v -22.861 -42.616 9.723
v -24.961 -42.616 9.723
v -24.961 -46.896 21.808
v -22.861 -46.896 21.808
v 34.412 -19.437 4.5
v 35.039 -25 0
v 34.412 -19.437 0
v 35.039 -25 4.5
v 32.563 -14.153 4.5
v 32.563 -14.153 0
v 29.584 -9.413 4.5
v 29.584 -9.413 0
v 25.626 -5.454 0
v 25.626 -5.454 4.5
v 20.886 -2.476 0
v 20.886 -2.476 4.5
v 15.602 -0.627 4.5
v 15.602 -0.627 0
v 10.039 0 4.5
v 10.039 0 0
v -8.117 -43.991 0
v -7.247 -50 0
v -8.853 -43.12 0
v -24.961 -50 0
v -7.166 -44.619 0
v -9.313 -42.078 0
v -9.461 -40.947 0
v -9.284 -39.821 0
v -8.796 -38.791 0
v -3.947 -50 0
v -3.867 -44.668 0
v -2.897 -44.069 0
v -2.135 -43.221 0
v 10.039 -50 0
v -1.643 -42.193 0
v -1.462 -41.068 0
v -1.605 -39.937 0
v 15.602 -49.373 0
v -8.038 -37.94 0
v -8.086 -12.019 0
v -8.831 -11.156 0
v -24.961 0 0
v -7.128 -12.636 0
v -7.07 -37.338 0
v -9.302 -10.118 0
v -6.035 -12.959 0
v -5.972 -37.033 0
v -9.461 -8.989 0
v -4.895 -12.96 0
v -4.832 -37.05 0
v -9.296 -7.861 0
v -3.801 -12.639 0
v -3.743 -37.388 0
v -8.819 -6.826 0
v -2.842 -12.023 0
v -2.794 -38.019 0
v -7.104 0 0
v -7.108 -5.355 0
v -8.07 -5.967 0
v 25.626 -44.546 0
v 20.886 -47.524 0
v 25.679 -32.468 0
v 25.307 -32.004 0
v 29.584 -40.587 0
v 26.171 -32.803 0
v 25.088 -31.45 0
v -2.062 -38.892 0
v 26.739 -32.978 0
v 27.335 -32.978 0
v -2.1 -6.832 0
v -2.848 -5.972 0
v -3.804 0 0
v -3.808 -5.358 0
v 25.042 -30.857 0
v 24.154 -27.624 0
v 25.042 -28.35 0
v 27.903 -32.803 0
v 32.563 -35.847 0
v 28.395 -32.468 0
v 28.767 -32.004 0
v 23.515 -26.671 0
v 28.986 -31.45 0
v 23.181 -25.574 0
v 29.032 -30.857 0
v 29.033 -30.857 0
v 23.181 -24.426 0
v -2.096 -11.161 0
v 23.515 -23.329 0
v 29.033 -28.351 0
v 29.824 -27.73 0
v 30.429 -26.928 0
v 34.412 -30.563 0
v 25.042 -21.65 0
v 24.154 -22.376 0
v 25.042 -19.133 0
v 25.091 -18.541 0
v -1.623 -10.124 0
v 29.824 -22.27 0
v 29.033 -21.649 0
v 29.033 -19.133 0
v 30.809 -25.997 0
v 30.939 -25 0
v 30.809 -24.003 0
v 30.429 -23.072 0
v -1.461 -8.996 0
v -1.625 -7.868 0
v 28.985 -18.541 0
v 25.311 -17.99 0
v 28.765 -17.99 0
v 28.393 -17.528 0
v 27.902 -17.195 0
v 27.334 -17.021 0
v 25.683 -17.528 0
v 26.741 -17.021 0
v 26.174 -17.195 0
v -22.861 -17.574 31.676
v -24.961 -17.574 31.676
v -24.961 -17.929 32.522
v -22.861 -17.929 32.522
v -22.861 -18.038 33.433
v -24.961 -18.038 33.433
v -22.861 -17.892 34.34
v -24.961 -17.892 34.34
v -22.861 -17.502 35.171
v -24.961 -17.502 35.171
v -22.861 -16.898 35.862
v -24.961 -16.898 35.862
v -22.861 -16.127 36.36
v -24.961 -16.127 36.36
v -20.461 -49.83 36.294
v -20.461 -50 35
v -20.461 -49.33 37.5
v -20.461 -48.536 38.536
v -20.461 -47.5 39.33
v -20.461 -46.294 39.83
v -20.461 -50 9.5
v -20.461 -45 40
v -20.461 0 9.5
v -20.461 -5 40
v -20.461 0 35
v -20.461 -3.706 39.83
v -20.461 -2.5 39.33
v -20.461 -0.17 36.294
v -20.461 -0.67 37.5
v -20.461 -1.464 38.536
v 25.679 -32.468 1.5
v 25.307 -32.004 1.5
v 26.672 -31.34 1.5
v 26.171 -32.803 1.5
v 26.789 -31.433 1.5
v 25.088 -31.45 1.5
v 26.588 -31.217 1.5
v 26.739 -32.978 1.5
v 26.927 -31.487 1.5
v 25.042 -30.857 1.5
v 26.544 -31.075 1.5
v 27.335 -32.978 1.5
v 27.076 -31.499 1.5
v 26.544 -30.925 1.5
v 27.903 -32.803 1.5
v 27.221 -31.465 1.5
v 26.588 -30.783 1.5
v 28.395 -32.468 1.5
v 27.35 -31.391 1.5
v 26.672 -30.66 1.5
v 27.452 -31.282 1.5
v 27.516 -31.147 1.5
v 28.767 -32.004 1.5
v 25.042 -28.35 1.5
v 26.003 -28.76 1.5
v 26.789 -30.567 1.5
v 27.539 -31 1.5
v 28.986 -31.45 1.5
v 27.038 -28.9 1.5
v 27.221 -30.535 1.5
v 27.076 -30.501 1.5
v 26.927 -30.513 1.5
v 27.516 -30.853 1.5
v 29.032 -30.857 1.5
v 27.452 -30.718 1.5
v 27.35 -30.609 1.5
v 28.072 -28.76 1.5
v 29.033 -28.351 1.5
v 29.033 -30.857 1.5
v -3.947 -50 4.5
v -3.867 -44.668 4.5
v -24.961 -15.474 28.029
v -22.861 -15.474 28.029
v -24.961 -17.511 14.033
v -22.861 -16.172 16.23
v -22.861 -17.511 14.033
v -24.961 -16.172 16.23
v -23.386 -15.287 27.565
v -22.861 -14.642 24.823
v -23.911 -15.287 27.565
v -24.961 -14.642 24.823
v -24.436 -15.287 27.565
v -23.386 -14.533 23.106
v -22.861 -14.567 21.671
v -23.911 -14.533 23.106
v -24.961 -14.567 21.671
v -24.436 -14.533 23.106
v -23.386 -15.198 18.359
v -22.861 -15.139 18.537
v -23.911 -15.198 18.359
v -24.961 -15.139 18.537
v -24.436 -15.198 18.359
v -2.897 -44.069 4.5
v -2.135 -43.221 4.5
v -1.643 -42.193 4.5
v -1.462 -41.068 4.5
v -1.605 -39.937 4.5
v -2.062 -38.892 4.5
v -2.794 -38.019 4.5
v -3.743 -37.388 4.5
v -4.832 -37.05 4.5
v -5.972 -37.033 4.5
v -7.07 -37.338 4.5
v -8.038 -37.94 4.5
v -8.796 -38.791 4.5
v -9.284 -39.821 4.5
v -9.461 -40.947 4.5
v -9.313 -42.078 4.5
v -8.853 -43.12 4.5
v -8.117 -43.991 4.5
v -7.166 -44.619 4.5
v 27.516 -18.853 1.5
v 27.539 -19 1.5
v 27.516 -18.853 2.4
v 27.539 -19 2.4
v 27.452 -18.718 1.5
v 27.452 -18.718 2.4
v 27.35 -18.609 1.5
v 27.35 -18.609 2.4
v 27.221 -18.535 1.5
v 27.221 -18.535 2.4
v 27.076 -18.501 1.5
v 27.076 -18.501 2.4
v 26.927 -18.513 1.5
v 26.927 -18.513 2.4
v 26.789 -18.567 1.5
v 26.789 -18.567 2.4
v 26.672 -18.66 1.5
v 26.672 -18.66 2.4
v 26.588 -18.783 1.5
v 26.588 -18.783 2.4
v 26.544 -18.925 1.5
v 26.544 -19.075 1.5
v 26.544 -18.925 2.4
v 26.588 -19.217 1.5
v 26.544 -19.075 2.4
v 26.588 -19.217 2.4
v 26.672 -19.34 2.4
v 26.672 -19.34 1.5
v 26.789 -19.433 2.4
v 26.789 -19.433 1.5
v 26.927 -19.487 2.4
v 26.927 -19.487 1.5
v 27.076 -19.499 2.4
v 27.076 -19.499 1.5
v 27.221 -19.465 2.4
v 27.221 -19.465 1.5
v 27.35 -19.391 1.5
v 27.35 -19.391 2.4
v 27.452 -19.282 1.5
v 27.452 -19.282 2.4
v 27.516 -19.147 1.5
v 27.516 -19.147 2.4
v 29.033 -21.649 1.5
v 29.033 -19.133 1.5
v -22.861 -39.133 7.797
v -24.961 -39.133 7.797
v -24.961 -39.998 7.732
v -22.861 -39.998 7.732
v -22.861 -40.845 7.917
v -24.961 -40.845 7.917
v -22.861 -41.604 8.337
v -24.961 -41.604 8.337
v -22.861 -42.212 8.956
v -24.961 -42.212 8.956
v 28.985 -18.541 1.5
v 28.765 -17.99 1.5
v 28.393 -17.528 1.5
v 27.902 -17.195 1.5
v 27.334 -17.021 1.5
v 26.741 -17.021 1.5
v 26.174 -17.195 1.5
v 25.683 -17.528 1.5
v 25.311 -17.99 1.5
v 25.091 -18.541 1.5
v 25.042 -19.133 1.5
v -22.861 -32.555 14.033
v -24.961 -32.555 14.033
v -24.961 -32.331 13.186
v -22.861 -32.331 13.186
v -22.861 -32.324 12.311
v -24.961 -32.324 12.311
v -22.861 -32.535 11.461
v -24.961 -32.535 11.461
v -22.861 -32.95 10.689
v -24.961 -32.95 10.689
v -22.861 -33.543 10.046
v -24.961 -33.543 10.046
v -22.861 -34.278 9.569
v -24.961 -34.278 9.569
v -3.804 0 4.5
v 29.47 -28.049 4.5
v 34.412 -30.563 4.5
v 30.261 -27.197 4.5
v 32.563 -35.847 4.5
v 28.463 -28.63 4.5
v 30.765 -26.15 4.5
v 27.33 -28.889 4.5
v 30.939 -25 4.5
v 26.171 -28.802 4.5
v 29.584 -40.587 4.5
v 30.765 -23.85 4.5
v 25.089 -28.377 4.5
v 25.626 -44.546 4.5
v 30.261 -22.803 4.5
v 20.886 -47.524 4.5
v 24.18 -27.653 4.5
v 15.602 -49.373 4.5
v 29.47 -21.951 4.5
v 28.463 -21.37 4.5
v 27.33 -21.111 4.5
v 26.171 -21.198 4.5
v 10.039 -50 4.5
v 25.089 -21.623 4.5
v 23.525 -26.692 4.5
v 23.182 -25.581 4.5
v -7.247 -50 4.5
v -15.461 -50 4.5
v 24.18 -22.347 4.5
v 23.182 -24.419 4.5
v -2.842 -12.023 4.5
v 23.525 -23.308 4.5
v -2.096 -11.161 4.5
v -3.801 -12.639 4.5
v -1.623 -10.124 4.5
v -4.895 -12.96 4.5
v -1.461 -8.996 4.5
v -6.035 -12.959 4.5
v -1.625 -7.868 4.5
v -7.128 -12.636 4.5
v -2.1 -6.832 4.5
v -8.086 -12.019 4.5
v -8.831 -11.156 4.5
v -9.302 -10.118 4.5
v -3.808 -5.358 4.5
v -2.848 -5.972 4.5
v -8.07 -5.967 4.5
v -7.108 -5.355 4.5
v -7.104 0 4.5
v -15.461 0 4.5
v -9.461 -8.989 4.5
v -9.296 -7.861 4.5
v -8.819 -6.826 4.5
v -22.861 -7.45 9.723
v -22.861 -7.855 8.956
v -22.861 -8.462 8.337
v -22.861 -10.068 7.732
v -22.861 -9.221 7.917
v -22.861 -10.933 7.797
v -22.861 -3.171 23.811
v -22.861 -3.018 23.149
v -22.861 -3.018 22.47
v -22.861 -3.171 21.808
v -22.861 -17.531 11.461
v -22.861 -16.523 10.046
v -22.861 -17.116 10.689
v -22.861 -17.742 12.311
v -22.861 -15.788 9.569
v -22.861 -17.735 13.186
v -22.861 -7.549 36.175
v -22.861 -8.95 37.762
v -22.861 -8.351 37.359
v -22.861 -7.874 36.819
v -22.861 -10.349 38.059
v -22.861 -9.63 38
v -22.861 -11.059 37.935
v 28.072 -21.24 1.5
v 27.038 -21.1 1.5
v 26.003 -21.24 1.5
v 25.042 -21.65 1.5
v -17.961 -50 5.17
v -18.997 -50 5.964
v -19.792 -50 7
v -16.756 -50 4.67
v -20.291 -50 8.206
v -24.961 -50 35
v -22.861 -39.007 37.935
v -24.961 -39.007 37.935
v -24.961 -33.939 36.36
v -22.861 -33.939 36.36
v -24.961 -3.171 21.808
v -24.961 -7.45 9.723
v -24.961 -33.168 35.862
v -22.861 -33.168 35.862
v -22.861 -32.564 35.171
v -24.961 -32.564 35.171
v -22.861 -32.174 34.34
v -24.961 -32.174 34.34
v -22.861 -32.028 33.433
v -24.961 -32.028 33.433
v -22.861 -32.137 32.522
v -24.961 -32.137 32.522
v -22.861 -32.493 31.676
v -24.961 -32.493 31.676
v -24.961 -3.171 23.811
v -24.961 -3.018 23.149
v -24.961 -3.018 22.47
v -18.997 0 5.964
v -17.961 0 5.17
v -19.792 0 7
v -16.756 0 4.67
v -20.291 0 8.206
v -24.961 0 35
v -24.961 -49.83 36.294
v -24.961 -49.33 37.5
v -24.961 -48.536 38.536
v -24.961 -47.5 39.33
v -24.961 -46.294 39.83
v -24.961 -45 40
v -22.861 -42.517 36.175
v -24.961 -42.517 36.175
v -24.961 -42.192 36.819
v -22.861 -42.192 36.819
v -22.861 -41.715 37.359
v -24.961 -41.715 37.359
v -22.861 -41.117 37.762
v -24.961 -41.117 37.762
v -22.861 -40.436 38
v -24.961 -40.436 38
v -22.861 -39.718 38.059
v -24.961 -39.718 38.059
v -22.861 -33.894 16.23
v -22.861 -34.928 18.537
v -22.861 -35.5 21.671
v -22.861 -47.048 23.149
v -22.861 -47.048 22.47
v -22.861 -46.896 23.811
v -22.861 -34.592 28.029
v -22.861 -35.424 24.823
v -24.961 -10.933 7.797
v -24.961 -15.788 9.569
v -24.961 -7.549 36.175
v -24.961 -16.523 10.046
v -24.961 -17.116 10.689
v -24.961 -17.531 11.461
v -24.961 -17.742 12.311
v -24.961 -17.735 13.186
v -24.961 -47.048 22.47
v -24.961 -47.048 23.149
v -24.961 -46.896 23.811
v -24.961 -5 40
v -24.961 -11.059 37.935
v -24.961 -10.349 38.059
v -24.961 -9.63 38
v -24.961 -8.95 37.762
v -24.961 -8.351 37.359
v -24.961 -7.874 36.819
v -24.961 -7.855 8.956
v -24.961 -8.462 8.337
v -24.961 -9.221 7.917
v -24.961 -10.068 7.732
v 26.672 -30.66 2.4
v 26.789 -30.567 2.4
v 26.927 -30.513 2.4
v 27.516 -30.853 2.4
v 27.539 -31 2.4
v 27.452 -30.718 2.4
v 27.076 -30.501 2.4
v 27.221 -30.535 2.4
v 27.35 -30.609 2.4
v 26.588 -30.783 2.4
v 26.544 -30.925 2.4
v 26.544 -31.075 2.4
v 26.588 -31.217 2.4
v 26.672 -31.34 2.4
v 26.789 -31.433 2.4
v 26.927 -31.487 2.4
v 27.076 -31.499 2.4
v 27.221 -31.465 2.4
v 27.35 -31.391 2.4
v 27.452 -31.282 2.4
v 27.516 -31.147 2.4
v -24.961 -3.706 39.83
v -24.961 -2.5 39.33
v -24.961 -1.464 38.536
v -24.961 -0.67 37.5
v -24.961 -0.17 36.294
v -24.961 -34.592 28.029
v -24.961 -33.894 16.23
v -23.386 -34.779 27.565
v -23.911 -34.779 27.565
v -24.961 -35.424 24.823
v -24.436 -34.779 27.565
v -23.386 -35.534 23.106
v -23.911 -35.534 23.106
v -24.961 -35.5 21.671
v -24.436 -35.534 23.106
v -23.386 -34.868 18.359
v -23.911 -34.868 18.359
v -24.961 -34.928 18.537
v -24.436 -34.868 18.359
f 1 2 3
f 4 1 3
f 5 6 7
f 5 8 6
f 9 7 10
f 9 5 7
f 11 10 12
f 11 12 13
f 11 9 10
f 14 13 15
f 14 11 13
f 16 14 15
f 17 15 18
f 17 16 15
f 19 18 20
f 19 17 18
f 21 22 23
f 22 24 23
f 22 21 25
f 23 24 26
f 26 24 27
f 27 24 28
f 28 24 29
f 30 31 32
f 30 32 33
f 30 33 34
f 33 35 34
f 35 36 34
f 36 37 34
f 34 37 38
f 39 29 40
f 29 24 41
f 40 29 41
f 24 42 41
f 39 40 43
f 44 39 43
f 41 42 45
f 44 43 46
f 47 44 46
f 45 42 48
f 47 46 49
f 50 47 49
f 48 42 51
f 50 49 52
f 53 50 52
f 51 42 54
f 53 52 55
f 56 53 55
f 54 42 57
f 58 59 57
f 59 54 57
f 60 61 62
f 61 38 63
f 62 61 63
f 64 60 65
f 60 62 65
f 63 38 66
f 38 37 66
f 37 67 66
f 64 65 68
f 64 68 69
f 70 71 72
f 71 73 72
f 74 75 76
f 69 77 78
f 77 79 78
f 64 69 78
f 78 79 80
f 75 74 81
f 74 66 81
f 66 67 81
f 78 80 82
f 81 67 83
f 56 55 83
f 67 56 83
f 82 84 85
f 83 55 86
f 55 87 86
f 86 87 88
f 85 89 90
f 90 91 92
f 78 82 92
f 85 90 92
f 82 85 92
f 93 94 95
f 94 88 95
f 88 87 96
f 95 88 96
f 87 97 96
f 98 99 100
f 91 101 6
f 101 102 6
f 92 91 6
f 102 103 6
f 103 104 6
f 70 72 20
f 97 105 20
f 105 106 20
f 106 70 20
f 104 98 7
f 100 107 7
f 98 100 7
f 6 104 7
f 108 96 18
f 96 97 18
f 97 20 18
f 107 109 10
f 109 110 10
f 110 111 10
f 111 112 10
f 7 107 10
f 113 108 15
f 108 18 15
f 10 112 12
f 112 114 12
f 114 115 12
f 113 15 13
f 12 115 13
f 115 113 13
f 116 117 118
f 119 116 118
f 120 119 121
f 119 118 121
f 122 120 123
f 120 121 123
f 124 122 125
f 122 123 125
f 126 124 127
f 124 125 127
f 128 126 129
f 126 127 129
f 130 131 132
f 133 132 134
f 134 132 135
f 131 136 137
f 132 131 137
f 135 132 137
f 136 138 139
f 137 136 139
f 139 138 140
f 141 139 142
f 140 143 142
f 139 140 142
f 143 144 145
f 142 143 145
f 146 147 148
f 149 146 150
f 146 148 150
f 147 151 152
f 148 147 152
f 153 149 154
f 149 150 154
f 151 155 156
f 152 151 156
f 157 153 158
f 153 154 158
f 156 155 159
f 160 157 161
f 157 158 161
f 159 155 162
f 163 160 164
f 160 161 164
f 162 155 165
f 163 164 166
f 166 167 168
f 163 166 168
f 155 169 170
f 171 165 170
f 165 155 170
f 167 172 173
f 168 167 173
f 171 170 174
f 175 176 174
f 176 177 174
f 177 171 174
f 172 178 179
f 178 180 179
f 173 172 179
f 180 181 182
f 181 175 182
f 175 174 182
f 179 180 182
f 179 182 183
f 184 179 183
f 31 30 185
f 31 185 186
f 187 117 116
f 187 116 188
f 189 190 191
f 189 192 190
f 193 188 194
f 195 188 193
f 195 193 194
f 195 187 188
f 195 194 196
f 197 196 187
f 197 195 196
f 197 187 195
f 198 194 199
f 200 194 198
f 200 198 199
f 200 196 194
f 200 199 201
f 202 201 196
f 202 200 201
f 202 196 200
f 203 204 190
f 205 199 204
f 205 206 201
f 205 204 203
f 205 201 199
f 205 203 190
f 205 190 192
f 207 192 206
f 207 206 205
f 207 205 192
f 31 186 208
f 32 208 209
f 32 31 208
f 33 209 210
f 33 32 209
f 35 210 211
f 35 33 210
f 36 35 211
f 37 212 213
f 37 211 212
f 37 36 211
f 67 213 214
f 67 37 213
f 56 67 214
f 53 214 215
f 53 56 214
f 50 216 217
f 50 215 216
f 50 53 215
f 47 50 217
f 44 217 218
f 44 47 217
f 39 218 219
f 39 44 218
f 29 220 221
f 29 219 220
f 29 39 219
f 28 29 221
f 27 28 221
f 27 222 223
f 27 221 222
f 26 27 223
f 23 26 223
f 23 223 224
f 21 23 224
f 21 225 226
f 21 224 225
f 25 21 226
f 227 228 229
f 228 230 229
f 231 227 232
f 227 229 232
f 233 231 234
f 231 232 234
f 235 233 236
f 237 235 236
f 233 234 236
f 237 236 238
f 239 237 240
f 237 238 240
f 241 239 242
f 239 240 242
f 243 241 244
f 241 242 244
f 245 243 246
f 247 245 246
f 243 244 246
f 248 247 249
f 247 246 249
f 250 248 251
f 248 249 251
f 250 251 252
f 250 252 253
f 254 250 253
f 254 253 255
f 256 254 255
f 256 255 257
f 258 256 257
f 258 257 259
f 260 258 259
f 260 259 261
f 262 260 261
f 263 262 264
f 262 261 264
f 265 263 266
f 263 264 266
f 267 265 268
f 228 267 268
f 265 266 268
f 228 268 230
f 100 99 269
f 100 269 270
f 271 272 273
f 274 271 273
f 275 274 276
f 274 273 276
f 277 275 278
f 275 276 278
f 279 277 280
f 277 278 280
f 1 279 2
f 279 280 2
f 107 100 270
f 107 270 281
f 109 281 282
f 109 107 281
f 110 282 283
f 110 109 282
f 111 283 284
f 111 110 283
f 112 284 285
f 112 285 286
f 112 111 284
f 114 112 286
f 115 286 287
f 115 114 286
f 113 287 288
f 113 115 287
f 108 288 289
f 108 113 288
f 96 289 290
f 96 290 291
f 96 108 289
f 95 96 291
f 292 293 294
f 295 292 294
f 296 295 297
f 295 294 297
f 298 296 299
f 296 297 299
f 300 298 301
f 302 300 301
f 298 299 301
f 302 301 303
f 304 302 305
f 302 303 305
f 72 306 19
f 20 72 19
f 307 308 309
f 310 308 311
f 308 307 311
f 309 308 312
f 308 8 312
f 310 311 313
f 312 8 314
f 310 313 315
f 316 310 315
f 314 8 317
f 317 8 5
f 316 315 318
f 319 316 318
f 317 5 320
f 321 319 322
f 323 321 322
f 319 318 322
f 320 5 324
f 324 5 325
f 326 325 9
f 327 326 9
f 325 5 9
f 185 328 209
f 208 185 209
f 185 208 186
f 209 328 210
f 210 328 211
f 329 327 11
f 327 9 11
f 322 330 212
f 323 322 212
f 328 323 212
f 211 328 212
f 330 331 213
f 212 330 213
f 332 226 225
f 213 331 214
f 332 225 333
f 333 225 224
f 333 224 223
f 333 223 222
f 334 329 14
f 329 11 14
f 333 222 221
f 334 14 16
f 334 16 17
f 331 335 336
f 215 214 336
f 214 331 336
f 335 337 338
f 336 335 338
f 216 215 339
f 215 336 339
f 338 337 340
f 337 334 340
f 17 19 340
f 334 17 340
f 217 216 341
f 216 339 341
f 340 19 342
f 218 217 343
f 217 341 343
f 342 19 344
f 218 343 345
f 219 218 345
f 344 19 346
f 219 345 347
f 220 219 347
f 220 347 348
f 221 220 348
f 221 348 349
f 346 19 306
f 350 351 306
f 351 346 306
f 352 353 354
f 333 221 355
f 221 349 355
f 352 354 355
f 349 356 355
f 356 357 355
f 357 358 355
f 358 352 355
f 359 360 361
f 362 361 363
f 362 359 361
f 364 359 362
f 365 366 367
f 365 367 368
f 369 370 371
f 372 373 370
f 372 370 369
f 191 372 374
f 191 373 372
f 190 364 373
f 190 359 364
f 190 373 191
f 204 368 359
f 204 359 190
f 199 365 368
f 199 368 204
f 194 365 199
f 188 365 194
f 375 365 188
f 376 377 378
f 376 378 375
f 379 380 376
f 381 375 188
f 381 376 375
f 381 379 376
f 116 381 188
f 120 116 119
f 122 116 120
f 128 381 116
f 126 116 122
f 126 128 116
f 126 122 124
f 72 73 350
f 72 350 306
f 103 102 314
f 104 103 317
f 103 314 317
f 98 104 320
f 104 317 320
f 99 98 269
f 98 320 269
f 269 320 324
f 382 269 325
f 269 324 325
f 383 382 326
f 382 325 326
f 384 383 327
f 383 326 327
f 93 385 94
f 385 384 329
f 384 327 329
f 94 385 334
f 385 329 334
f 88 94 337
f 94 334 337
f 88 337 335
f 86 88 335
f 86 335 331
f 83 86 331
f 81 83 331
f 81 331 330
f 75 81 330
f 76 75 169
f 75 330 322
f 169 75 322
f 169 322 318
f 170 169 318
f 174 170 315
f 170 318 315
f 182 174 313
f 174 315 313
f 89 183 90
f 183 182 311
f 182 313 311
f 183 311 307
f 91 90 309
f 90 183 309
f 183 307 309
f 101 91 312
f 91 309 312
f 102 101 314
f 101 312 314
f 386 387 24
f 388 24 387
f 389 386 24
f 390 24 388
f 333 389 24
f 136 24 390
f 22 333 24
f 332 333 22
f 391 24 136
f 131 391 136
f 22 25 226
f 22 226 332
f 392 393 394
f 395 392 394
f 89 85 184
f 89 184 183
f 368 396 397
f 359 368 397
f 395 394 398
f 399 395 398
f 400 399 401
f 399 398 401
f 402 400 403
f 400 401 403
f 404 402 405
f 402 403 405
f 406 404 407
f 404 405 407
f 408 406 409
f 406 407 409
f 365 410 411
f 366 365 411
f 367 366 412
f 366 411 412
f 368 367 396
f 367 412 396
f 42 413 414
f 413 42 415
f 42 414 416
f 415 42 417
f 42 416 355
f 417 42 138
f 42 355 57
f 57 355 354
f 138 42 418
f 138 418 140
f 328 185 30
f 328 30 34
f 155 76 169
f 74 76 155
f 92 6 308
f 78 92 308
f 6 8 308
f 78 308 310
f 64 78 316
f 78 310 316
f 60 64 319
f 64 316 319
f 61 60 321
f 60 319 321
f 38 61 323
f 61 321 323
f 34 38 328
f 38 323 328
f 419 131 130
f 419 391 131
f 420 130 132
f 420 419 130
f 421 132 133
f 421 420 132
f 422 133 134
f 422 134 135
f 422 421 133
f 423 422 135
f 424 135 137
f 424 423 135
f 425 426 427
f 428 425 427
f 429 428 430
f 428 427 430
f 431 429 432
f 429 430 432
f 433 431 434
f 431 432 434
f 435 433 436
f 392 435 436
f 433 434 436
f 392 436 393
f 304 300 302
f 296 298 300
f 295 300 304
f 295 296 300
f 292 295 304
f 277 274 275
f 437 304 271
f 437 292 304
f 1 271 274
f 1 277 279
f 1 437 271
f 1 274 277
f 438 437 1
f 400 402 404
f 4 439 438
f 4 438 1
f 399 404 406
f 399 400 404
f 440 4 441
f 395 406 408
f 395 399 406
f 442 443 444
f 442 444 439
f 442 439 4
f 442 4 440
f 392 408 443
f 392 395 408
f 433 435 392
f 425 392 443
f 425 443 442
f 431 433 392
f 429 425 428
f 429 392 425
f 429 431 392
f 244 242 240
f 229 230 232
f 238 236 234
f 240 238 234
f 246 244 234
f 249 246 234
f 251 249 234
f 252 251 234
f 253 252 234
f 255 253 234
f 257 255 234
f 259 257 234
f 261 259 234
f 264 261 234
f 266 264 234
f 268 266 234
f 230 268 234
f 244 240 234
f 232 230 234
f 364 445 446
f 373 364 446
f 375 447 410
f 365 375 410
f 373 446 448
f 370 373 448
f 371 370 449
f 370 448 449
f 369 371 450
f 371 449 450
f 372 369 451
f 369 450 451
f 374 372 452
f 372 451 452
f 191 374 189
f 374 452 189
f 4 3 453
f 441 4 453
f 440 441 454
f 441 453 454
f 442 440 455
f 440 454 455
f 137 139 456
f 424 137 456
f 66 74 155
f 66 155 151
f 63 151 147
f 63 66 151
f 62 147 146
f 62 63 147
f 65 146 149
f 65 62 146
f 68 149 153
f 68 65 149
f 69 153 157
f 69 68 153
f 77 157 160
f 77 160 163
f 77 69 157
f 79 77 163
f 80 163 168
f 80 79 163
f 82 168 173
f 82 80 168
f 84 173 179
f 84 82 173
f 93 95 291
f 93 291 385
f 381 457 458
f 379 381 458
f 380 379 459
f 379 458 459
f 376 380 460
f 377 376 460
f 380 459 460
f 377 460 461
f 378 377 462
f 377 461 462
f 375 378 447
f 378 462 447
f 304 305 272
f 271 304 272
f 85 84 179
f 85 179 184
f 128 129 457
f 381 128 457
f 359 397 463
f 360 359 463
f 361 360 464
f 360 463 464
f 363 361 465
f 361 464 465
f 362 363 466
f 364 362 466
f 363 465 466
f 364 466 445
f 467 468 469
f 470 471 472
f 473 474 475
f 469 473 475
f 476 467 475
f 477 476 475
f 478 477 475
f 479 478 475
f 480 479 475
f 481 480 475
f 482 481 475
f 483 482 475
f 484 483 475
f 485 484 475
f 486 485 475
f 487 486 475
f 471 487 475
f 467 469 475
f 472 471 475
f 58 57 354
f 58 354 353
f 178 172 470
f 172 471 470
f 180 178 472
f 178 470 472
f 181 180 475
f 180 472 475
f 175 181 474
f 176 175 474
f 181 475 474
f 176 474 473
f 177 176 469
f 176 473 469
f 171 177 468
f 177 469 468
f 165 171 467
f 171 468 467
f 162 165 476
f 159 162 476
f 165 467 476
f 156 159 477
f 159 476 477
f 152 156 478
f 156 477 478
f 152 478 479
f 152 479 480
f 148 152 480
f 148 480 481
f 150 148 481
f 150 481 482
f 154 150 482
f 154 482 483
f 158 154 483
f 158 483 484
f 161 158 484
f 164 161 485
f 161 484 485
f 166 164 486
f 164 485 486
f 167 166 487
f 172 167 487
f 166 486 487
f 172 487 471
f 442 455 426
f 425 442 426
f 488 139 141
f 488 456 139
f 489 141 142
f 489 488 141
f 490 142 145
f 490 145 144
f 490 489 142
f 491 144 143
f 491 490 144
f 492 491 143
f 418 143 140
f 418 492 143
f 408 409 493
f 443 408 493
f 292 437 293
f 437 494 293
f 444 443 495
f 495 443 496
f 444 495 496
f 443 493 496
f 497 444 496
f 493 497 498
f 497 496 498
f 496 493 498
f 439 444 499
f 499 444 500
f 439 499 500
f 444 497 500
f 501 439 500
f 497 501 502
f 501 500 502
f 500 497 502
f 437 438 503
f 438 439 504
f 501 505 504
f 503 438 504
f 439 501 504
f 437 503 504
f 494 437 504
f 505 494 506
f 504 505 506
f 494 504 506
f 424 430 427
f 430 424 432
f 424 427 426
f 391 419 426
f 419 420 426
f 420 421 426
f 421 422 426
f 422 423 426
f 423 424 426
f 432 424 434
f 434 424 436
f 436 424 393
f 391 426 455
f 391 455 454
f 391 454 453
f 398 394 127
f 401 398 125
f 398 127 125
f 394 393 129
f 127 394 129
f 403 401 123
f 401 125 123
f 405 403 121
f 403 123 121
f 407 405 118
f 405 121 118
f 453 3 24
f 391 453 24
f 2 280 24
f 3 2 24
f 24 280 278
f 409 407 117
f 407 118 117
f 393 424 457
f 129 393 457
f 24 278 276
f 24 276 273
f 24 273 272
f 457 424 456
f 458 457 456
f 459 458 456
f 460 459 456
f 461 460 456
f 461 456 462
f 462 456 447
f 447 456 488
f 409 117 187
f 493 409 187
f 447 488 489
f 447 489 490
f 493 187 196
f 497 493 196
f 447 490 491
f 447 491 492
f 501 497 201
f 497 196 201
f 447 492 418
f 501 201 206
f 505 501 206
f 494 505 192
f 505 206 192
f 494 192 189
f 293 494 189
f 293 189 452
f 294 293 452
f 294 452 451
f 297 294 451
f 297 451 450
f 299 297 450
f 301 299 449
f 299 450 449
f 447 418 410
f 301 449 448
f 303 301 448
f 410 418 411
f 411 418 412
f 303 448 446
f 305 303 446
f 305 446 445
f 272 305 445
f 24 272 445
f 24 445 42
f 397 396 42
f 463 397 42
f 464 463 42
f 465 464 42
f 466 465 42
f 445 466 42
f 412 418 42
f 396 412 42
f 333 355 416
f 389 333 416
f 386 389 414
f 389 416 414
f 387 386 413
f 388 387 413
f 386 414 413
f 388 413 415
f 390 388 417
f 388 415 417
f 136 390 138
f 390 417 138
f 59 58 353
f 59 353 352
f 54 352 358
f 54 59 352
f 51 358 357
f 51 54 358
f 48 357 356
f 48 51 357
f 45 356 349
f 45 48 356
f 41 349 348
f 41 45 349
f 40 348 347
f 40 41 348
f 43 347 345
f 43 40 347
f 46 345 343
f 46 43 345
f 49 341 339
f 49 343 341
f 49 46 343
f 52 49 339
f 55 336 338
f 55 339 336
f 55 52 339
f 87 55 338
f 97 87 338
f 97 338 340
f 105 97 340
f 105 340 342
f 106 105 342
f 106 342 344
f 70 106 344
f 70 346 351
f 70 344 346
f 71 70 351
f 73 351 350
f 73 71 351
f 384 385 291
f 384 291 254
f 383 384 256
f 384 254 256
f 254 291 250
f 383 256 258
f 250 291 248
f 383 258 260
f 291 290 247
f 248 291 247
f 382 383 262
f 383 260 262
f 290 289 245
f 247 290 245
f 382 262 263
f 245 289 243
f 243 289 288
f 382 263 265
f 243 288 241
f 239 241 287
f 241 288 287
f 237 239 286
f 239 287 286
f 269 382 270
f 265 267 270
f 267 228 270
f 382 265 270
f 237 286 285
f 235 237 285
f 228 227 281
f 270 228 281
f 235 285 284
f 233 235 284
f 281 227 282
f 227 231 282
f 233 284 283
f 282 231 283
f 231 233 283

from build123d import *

# Parameters (mm, degrees)
F1_DEPTH  = 50
F2_R      = 25
F3_R      = 24.99999
F4_R      = 3.9
F5_DEPTH  = 12.5
F7_R      = 0.5
F8_DEPTH  = 2.4
F6_R      = 0.5
F9_DEPTH  = 2.4
F11_DEPTH = 1.5
F12_R     = 5
F13_R     = 5
F15_DEPTH = 2.1
F17_DEPTH = 25
F18_DEPTH = 25


# Not quite as in the source:
# - a fillet or chamfer is up to 0.001 mm smaller than in the source, because OpenCascade refuses the exact size
# - ends of sketch curves that miss each other by under 0.0002 mm in the source are joined


with BuildPart() as f1:
    # F0 (on Front) → F1 (new body)
    with BuildSketch(Plane.XZ):
        with BuildLine():
            Line((-24.9614193552, 0), (35.0385806448, 0))
            Line((35.0385806448, 0), (35.0385806448, 4.5))
            Line((35.0385806448, 4.5), (-15.4614193552, 4.5))
            ThreePointArc((-15.4614193552, 4.5), (-18.9969532612, 5.9644660941), (-20.4614193552, 9.5))
            Line((-20.4614193552, 9.5), (-20.4614193552, 40))
            Line((-20.4614193552, 40), (-24.9614193552, 40))
            Line((-24.9614193552, 40), (-24.9614193552, 0))
        make_face()
    extrude(amount=F1_DEPTH)

    # F2
    f2_edges = [f1.edges().sort_by_distance(p)[0] for p in [
        (35.038581, 0, 2.25),
    ]]
    fillet(f2_edges, radius=F2_R)

    # F3 (radius 25 in the source; OpenCascade refuses exactly that, so slightly less here)
    f3_edges = [f1.edges().sort_by_distance(p)[0] for p in [
        (35.038581, -50, 2.25),
    ]]
    fillet(f3_edges, radius=F3_R)

    # F4 (on face) → F5 (cut, symmetric)
    with BuildSketch(Plane.XY.offset(4.5)):
        with Locations((27.0385806448, -25)):
            Circle(F4_R)
    extrude(amount=F5_DEPTH, both=True, mode=Mode.SUBTRACT)

    # F7 (on Top) → F8 (cut, symmetric)
    with BuildSketch(Plane.XY):
        with Locations((27.0385806448, -19)):
            Circle(F7_R)
    extrude(amount=F8_DEPTH, both=True, mode=Mode.SUBTRACT)

    # F6 (on Top) → F9 (cut, symmetric)
    with BuildSketch(Plane.XY):
        with Locations((27.0385806448, -31)):
            Circle(F6_R)
    extrude(amount=F9_DEPTH, both=True, mode=Mode.SUBTRACT)

    # F10 (on Top) → F11 (cut)
    with BuildSketch(Plane.XY):
        with BuildLine():
            Line((25.0421970529, -19.1326886576), (25.0421970529, -30.8567436225))
            ThreePointArc((25.0421970529, -30.8567436225), (27.0370224854, -33.0005194676), (29.031847918, -30.8567436225))
            Line((29.031847918, -30.8567436225), (29.0331744321, -30.8567436225))
            Line((29.0331744321, -30.8567436225), (29.0331744321, -19.1326886576))
            ThreePointArc((29.0331744321, -19.1326886576), (27.0376323306, -16.9991781279), (25.0421970529, -19.1326886576))
        make_face()
    extrude(amount=F11_DEPTH, mode=Mode.SUBTRACT)

    # F12
    f12_edges = [f1.edges().sort_by_distance(p)[0] for p in [
        (-22.711419, -50, 40),
    ]]
    fillet(f12_edges, radius=F12_R)

    # F13
    f13_edges = [f1.edges().sort_by_distance(p)[0] for p in [
        (-22.711419, 0, 40),
    ]]
    fillet(f13_edges, radius=F13_R)

    # F14 (on face) → F15 (cut)
    with BuildSketch(Plane(origin=(-24.9614193552, 0, 0), x_dir=(0, -1, 0), z_dir=(-1, 0, 0))):
        with BuildLine():
            Line((46.8955885446, 23.8107649305), (42.5171071131, 36.1752150642))
            ThreePointArc((42.5171071131, 36.1752150642), (41.1165449237, 37.7616933331), (39.0073708388, 37.93452974))
            Line((39.0073708388, 37.93452974), (33.9392572641, 36.3604687154))
            ThreePointArc((33.9392572641, 36.3604687154), (32.1739564338, 34.3397574907), (32.4926399743, 31.675549977))
            add(Edge.make_bspline(
                [(32.4926399743, 31.675549977), (33.3670492771, 30.3381403961), (35.0987739091, 27.6894664778), (35.7199990478, 23.1066149427), (35.2211127015, 18.2107984297), (33.4472667585, 15.4309330693), (32.5552672148, 14.0330446884)],
                knots=[0, 0, 0, 0, 0.2493081883, 0.4937426091, 0.7454224458, 1, 1, 1, 1], degree=3))
            ThreePointArc((32.5552672148, 14.0330446884), (32.5347631708, 11.4606329376), (34.2782102525, 9.5690423623))
            Line((34.2782102525, 9.5690423623), (39.1331128776, 7.7970703132))
            ThreePointArc((39.1331128776, 7.7970703132), (41.2400733133, 8.0993579825), (42.6161779425, 9.723241033))
            Line((42.6161779425, 9.723241033), (46.8955885446, 21.8079237751))
            ThreePointArc((46.8955885446, 21.8079237751), (47.0676640713, 22.8093443528), (46.8955885446, 23.8107649305))
        make_face()
        with BuildLine():
            ThreePointArc((3.1705893979, 23.8107653384), (2.9985138712, 22.8093447607), (3.1705893979, 21.807924183))
            Line((3.1705893979, 21.807924183), (7.45, 9.723241441))
            ThreePointArc((7.45, 9.723241441), (8.8261046292, 8.0993583904), (10.9330650649, 7.7970707212))
            Line((10.9330650649, 7.7970707212), (15.78796769, 9.5690427702))
            ThreePointArc((15.78796769, 9.5690427702), (17.5314147718, 11.4606333455), (17.5109107277, 14.0330450963))
            add(Edge.make_bspline(
                [(17.5735379682, 31.6755503849), (16.6991286655, 30.3381408041), (14.9674040335, 27.6894668857), (14.3461788947, 23.1066153507), (14.8450652411, 18.2107988376), (16.618911184, 15.4309334772), (17.5109107277, 14.0330450963)],
                knots=[0, 0, 0, 0, 0.2493081883, 0.4937426091, 0.7454224458, 1, 1, 1, 1], degree=3))
            ThreePointArc((17.5735379682, 31.6755503849), (17.8922215087, 34.3397578986), (16.1269206784, 36.3604691233))
            Line((16.1269206784, 36.3604691233), (11.0588071037, 37.9345301479))
            ThreePointArc((11.0588071037, 37.9345301479), (8.9496330188, 37.7616937411), (7.5490708294, 36.1752154721))
            Line((7.5490708294, 36.1752154721), (3.1705893979, 23.8107653384))
        make_face()
    extrude(amount=-F15_DEPTH, mode=Mode.SUBTRACT)

    # F16 (on Top) → F17 (cut)
    with BuildSketch(Plane.XY):
        with BuildLine():
            Line((-7.103768643, 0), (-7.1083206196, -5.3547680149))
            ThreePointArc((-7.1083206196, -5.3547680149), (-5.4648196706, -12.9999985547), (-3.8083230043, -5.357573274))
            Line((-3.8083230043, -5.357573274), (-3.803768643, 0))
            Line((-3.803768643, 0), (-7.103768643, 0))
        make_face()
        with BuildLine():
            Line((-3.9466372691, -50.0011853874), (-3.8665251866, -44.6682846933))
            ThreePointArc((-3.8665251866, -44.6682846933), (-5.4013371978, -37.0004512587), (-7.1657806518, -44.6187225054))
            Line((-7.1657806518, -44.6187225054), (-7.2466372691, -50.0011853874))
            Line((-7.2466372691, -50.0011853874), (-3.9466372691, -50.0011853874))
        make_face()
    extrude(amount=F17_DEPTH, mode=Mode.SUBTRACT)

    # F16 (on Top) → F18 (cut)
    with BuildSketch(Plane.XY):
        with BuildLine():
            Line((-7.103768643, 0), (-7.1083206196, -5.3547680149))
            ThreePointArc((-7.1083206196, -5.3547680149), (-5.4648196706, -12.9999985547), (-3.8083230043, -5.357573274))
            Line((-3.8083230043, -5.357573274), (-3.803768643, 0))
            Line((-3.803768643, 0), (-7.103768643, 0))
        make_face()
        with BuildLine():
            Line((-3.9466372691, -50.0011853874), (-3.8665251866, -44.6682846933))
            ThreePointArc((-3.8665251866, -44.6682846933), (-5.4013371978, -37.0004512587), (-7.1657806518, -44.6187225054))
            Line((-7.1657806518, -44.6187225054), (-7.2466372691, -50.0011853874))
            Line((-7.2466372691, -50.0011853874), (-3.9466372691, -50.0011853874))
        make_face()
    extrude(amount=F18_DEPTH, mode=Mode.SUBTRACT)


solid = f1.part
